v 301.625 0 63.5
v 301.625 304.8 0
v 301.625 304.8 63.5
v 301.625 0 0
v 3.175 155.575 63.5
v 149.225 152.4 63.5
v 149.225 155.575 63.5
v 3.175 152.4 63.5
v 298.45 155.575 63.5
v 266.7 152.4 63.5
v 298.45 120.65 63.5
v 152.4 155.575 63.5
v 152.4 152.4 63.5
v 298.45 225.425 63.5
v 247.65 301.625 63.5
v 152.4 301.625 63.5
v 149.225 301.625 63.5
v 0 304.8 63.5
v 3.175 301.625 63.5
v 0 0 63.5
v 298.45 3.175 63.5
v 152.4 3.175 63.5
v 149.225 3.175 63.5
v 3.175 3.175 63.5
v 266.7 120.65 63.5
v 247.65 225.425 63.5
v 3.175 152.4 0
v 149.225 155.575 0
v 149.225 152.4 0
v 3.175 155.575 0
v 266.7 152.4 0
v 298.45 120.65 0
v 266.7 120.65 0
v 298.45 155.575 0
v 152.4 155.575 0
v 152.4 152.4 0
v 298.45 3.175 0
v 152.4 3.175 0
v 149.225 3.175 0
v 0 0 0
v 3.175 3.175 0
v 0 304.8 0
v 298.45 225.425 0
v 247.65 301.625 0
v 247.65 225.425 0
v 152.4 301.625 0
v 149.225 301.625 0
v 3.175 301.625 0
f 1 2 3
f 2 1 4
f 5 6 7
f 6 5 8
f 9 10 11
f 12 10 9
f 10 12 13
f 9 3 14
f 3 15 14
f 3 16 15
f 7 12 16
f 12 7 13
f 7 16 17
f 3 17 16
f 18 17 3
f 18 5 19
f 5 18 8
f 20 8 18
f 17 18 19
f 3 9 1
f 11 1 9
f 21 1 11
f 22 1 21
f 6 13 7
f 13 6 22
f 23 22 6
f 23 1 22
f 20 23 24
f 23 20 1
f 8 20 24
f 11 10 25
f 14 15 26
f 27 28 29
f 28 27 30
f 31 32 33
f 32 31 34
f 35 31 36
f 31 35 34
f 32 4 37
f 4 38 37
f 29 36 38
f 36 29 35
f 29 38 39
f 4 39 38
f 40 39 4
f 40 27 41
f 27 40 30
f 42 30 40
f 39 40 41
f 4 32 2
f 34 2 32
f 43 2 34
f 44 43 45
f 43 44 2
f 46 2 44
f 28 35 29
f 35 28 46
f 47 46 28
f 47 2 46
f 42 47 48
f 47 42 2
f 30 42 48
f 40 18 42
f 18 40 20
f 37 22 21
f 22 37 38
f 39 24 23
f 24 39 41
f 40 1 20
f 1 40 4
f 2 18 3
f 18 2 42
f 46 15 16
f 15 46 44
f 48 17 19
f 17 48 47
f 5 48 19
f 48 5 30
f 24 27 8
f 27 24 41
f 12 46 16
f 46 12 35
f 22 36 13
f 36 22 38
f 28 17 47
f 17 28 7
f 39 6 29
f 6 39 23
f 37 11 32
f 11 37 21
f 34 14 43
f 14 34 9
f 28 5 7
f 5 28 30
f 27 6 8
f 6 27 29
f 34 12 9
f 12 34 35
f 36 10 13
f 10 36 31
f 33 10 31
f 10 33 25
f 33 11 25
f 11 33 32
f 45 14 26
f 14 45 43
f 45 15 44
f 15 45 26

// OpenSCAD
roomsize = 23;
wallthickness = .5; // In feet
scalefactor = 6.35; // scale factor - 1 foot eq 1/4 inch
wallheight = 10;
elevatorsize = 5;
closetsize = 14;
bathroomdepth=12;
bathroomwidth=8;
kingbedsize = 7;

backwalloffset = wallthickness + roomsize + wallthickness + roomsize + wallthickness;
interiorwallsize = roomsize + wallthickness + roomsize + wallthickness;
farsidewallposition = wallthickness + roomsize + wallthickness + roomsize;
module bfwall()
{
     backwallsize = wallthickness + roomsize + wallthickness + roomsize + wallthickness;
     cube([backwallsize * scalefactor,wallthickness*scalefactor,wallheight*scalefactor]);
}
module midsidewall()
{
     cube([wallthickness * scalefactor,interiorwallsize*scalefactor,wallheight*scalefactor]);
}

module midroomdivider()
{
     cube([roomsize * scalefactor,wallthickness * scalefactor,wallheight*scalefactor]);
}

module elevator()
{
     cube([elevatorsize * scalefactor,elevatorsize * scalefactor, wallheight*scalefactor]);

}

module bathroom()
{

    cube([bathroomdepth * scalefactor, bathroomwidth * scalefactor, wallheight * scalefactor]);

}

translate([0,0,0]) bfwall(); // Front Wall
translate([0,backwalloffset * scalefactor,0]) bfwall();
midwallposition = wallthickness + roomsize;
translate([0,wallthickness * scalefactor,0]) midsidewall();
translate([midwallposition * scalefactor,wallthickness * scalefactor,0]) midsidewall();
translate([farsidewallposition * scalefactor,wallthickness * scalefactor,0]) midsidewall();
roomdivposition = wallthickness + roomsize + wallthickness;
translate([wallthickness * scalefactor,roomdivposition * scalefactor,0]) midroomdivider();
translate([(wallthickness + roomsize + wallthickness) * scalefactor,roomdivposition * scalefactor,0]) midroomdivider();
elevatorpositionx = wallthickness + roomsize + wallthickness + roomsize - elevatorsize;
//elevatorpositiony = wallthickness + roomsize + wallthickness + roomsize - elevatorsize/2;
elevatorpositiony = wallthickness + roomsize + wallthickness - elevatorsize;

translate([elevatorpositionx * scalefactor,elevatorpositiony * scalefactor,0]) elevator();
firstbathroompositionx = wallthickness + roomsize + wallthickness + roomsize - bathroomwidth;
firstbathroompositiony = wallthickness + roomsize + wallthickness + roomsize + wallthickness;


translate([firstbathroompositionx * scalefactor,firstbathroompositiony * scalefactor,0]) rotate([0,0,-90]) bathroom();
